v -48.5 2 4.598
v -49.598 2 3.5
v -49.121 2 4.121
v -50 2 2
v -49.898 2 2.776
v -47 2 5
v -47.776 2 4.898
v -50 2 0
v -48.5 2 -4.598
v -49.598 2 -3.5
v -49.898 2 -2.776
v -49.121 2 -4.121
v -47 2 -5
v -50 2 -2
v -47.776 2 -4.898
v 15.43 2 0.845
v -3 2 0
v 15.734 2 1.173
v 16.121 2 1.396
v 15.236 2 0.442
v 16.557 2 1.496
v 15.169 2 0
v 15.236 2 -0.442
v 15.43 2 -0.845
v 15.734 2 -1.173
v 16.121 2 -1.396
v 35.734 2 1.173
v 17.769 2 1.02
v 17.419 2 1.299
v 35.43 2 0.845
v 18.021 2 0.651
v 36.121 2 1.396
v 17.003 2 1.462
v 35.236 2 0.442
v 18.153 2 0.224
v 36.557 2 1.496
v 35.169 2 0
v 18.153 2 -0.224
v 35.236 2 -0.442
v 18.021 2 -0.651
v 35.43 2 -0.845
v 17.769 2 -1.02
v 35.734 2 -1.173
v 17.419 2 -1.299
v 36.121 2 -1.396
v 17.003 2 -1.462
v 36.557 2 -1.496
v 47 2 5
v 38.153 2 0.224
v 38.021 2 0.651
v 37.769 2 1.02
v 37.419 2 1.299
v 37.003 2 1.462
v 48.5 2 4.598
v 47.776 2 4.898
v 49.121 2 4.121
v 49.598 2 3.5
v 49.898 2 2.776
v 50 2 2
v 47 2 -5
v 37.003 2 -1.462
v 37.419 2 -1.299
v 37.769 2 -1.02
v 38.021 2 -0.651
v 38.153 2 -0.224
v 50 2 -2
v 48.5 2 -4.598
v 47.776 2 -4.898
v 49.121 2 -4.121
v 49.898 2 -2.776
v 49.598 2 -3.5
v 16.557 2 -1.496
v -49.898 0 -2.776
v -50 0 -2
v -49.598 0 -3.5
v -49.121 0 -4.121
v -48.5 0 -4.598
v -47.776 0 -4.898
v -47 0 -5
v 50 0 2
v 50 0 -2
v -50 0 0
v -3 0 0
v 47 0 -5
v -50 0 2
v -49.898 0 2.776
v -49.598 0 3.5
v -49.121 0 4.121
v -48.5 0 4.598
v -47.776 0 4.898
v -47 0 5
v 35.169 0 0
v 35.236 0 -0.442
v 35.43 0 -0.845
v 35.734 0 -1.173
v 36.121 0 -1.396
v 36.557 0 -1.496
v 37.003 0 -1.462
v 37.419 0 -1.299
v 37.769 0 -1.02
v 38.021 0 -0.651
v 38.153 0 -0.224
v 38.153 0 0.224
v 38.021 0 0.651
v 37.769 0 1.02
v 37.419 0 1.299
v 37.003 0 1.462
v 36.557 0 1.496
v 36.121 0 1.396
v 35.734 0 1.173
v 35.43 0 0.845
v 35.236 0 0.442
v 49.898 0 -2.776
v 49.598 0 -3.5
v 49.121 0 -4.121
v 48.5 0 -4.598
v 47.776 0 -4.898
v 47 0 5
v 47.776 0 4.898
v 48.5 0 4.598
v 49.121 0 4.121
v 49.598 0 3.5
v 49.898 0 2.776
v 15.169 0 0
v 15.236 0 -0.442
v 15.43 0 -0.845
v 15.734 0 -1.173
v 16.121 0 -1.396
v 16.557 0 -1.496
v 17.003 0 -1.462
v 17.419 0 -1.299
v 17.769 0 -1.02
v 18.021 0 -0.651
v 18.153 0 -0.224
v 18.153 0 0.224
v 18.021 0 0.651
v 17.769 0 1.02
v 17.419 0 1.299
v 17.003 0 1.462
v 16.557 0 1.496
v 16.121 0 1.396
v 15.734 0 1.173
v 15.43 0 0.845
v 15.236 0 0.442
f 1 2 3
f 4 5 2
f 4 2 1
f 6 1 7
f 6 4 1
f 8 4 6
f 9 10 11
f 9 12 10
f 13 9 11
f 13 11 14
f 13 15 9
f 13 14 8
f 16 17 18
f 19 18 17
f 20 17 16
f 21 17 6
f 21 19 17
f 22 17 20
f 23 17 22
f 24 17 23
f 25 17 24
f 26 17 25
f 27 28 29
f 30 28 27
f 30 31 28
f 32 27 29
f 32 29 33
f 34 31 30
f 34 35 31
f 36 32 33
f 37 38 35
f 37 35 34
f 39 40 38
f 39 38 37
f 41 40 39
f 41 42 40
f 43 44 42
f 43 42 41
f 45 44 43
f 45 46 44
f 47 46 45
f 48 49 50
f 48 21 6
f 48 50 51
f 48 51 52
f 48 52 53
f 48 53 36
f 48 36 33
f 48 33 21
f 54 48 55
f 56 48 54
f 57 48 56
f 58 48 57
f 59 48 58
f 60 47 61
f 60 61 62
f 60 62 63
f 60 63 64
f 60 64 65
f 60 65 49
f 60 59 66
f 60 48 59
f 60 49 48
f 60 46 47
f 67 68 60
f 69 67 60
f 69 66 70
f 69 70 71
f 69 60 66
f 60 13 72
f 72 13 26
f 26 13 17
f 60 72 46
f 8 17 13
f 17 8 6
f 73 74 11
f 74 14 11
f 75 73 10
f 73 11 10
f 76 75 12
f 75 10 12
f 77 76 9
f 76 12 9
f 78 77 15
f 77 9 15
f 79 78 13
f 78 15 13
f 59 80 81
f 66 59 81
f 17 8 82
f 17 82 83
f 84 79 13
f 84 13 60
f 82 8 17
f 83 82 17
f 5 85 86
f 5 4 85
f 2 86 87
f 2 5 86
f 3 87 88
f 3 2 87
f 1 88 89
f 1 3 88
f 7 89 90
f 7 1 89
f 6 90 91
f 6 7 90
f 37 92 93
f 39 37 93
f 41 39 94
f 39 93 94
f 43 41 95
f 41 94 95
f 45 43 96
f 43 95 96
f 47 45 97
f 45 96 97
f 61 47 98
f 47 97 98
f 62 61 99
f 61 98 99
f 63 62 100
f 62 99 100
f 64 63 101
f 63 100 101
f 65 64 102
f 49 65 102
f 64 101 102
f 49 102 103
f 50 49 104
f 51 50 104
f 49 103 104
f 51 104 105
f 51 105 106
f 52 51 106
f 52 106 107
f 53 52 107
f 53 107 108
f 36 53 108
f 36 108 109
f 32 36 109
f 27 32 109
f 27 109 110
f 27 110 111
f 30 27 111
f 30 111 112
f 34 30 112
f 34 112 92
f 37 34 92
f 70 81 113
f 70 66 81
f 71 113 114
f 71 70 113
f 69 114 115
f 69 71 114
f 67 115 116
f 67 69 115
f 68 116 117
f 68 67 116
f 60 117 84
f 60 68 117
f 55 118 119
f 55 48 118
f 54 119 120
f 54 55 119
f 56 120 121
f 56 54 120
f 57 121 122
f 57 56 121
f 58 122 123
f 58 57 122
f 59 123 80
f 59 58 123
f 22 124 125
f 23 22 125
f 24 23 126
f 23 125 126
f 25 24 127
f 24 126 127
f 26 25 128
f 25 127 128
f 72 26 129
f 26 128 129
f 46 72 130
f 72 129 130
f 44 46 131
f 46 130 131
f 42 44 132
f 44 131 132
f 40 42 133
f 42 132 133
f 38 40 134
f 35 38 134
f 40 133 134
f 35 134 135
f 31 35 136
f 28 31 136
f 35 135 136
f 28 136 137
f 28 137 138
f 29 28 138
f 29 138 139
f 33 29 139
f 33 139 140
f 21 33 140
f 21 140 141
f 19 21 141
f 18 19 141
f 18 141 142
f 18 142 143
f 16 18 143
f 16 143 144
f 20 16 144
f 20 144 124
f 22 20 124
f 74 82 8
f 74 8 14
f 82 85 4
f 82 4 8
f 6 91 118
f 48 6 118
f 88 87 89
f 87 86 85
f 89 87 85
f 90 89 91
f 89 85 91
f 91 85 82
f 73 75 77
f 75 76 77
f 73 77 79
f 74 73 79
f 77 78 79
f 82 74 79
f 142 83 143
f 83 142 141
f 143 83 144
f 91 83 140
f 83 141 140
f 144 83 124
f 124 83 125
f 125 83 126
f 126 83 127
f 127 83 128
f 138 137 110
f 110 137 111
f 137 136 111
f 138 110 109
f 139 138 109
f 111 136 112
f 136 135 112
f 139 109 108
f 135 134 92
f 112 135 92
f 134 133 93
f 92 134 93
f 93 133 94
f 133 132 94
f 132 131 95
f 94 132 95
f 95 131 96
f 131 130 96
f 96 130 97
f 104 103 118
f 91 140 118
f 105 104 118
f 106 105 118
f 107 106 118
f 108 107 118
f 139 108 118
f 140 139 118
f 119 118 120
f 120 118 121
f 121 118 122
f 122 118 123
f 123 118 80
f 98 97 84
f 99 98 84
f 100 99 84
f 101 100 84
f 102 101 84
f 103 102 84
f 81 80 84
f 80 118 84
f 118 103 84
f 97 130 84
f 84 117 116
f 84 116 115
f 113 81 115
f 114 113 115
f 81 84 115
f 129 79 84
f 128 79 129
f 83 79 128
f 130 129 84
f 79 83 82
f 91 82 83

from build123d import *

# Parameters (mm, degrees)
SKETCH1_W             = 100
SKETCH1_H             = 10
BOSS_EXTRUDE1_DEPTH   = 2
FILLET1_R             = 3
F_3_0MM_DOWEL_HOLE1_D = 3
SKETCH2_W             = 47
SKETCH2_H             = 0.001
CUT_EXTRUDE1_DEPTH    = 10


with BuildPart() as part:
    # Sketch1 → Boss-Extrude1 (new body)
    with BuildSketch(Plane(origin=(0, 0, 0), x_dir=(1, 0, 0), z_dir=(0, 1, 0))):
        Rectangle(SKETCH1_W, SKETCH1_H)
    extrude(amount=BOSS_EXTRUDE1_DEPTH)

    # Fillet1
    fillet1_edges = [part.edges().sort_by_distance(p)[0] for p in [
        (50, 1, 5),
        (-50, 1, 5),
        (-50, 1, -5),
        (50, 1, -5),
    ]]
    fillet(fillet1_edges, radius=FILLET1_R)

    # Ø3.0mm Dowel Hole1 (through all)
    with Locations(Plane(origin=(0, 2, 0), x_dir=(1, 0, 0), z_dir=(0, 1, 0))):
        with Locations((36.669467955, 0), (16.669467955, 0)):
            Hole(F_3_0MM_DOWEL_HOLE1_D / 2)

    # Sketch2 → Cut-Extrude1 (cut)
    with BuildSketch(Plane(origin=(0, 2, 0), x_dir=(1, 0, 0), z_dir=(0, 1, 0))):
        with Locations((-26.5, 0)):
            Rectangle(SKETCH2_W, SKETCH2_H)
    extrude(amount=-CUT_EXTRUDE1_DEPTH, mode=Mode.SUBTRACT)


solid = part.part
